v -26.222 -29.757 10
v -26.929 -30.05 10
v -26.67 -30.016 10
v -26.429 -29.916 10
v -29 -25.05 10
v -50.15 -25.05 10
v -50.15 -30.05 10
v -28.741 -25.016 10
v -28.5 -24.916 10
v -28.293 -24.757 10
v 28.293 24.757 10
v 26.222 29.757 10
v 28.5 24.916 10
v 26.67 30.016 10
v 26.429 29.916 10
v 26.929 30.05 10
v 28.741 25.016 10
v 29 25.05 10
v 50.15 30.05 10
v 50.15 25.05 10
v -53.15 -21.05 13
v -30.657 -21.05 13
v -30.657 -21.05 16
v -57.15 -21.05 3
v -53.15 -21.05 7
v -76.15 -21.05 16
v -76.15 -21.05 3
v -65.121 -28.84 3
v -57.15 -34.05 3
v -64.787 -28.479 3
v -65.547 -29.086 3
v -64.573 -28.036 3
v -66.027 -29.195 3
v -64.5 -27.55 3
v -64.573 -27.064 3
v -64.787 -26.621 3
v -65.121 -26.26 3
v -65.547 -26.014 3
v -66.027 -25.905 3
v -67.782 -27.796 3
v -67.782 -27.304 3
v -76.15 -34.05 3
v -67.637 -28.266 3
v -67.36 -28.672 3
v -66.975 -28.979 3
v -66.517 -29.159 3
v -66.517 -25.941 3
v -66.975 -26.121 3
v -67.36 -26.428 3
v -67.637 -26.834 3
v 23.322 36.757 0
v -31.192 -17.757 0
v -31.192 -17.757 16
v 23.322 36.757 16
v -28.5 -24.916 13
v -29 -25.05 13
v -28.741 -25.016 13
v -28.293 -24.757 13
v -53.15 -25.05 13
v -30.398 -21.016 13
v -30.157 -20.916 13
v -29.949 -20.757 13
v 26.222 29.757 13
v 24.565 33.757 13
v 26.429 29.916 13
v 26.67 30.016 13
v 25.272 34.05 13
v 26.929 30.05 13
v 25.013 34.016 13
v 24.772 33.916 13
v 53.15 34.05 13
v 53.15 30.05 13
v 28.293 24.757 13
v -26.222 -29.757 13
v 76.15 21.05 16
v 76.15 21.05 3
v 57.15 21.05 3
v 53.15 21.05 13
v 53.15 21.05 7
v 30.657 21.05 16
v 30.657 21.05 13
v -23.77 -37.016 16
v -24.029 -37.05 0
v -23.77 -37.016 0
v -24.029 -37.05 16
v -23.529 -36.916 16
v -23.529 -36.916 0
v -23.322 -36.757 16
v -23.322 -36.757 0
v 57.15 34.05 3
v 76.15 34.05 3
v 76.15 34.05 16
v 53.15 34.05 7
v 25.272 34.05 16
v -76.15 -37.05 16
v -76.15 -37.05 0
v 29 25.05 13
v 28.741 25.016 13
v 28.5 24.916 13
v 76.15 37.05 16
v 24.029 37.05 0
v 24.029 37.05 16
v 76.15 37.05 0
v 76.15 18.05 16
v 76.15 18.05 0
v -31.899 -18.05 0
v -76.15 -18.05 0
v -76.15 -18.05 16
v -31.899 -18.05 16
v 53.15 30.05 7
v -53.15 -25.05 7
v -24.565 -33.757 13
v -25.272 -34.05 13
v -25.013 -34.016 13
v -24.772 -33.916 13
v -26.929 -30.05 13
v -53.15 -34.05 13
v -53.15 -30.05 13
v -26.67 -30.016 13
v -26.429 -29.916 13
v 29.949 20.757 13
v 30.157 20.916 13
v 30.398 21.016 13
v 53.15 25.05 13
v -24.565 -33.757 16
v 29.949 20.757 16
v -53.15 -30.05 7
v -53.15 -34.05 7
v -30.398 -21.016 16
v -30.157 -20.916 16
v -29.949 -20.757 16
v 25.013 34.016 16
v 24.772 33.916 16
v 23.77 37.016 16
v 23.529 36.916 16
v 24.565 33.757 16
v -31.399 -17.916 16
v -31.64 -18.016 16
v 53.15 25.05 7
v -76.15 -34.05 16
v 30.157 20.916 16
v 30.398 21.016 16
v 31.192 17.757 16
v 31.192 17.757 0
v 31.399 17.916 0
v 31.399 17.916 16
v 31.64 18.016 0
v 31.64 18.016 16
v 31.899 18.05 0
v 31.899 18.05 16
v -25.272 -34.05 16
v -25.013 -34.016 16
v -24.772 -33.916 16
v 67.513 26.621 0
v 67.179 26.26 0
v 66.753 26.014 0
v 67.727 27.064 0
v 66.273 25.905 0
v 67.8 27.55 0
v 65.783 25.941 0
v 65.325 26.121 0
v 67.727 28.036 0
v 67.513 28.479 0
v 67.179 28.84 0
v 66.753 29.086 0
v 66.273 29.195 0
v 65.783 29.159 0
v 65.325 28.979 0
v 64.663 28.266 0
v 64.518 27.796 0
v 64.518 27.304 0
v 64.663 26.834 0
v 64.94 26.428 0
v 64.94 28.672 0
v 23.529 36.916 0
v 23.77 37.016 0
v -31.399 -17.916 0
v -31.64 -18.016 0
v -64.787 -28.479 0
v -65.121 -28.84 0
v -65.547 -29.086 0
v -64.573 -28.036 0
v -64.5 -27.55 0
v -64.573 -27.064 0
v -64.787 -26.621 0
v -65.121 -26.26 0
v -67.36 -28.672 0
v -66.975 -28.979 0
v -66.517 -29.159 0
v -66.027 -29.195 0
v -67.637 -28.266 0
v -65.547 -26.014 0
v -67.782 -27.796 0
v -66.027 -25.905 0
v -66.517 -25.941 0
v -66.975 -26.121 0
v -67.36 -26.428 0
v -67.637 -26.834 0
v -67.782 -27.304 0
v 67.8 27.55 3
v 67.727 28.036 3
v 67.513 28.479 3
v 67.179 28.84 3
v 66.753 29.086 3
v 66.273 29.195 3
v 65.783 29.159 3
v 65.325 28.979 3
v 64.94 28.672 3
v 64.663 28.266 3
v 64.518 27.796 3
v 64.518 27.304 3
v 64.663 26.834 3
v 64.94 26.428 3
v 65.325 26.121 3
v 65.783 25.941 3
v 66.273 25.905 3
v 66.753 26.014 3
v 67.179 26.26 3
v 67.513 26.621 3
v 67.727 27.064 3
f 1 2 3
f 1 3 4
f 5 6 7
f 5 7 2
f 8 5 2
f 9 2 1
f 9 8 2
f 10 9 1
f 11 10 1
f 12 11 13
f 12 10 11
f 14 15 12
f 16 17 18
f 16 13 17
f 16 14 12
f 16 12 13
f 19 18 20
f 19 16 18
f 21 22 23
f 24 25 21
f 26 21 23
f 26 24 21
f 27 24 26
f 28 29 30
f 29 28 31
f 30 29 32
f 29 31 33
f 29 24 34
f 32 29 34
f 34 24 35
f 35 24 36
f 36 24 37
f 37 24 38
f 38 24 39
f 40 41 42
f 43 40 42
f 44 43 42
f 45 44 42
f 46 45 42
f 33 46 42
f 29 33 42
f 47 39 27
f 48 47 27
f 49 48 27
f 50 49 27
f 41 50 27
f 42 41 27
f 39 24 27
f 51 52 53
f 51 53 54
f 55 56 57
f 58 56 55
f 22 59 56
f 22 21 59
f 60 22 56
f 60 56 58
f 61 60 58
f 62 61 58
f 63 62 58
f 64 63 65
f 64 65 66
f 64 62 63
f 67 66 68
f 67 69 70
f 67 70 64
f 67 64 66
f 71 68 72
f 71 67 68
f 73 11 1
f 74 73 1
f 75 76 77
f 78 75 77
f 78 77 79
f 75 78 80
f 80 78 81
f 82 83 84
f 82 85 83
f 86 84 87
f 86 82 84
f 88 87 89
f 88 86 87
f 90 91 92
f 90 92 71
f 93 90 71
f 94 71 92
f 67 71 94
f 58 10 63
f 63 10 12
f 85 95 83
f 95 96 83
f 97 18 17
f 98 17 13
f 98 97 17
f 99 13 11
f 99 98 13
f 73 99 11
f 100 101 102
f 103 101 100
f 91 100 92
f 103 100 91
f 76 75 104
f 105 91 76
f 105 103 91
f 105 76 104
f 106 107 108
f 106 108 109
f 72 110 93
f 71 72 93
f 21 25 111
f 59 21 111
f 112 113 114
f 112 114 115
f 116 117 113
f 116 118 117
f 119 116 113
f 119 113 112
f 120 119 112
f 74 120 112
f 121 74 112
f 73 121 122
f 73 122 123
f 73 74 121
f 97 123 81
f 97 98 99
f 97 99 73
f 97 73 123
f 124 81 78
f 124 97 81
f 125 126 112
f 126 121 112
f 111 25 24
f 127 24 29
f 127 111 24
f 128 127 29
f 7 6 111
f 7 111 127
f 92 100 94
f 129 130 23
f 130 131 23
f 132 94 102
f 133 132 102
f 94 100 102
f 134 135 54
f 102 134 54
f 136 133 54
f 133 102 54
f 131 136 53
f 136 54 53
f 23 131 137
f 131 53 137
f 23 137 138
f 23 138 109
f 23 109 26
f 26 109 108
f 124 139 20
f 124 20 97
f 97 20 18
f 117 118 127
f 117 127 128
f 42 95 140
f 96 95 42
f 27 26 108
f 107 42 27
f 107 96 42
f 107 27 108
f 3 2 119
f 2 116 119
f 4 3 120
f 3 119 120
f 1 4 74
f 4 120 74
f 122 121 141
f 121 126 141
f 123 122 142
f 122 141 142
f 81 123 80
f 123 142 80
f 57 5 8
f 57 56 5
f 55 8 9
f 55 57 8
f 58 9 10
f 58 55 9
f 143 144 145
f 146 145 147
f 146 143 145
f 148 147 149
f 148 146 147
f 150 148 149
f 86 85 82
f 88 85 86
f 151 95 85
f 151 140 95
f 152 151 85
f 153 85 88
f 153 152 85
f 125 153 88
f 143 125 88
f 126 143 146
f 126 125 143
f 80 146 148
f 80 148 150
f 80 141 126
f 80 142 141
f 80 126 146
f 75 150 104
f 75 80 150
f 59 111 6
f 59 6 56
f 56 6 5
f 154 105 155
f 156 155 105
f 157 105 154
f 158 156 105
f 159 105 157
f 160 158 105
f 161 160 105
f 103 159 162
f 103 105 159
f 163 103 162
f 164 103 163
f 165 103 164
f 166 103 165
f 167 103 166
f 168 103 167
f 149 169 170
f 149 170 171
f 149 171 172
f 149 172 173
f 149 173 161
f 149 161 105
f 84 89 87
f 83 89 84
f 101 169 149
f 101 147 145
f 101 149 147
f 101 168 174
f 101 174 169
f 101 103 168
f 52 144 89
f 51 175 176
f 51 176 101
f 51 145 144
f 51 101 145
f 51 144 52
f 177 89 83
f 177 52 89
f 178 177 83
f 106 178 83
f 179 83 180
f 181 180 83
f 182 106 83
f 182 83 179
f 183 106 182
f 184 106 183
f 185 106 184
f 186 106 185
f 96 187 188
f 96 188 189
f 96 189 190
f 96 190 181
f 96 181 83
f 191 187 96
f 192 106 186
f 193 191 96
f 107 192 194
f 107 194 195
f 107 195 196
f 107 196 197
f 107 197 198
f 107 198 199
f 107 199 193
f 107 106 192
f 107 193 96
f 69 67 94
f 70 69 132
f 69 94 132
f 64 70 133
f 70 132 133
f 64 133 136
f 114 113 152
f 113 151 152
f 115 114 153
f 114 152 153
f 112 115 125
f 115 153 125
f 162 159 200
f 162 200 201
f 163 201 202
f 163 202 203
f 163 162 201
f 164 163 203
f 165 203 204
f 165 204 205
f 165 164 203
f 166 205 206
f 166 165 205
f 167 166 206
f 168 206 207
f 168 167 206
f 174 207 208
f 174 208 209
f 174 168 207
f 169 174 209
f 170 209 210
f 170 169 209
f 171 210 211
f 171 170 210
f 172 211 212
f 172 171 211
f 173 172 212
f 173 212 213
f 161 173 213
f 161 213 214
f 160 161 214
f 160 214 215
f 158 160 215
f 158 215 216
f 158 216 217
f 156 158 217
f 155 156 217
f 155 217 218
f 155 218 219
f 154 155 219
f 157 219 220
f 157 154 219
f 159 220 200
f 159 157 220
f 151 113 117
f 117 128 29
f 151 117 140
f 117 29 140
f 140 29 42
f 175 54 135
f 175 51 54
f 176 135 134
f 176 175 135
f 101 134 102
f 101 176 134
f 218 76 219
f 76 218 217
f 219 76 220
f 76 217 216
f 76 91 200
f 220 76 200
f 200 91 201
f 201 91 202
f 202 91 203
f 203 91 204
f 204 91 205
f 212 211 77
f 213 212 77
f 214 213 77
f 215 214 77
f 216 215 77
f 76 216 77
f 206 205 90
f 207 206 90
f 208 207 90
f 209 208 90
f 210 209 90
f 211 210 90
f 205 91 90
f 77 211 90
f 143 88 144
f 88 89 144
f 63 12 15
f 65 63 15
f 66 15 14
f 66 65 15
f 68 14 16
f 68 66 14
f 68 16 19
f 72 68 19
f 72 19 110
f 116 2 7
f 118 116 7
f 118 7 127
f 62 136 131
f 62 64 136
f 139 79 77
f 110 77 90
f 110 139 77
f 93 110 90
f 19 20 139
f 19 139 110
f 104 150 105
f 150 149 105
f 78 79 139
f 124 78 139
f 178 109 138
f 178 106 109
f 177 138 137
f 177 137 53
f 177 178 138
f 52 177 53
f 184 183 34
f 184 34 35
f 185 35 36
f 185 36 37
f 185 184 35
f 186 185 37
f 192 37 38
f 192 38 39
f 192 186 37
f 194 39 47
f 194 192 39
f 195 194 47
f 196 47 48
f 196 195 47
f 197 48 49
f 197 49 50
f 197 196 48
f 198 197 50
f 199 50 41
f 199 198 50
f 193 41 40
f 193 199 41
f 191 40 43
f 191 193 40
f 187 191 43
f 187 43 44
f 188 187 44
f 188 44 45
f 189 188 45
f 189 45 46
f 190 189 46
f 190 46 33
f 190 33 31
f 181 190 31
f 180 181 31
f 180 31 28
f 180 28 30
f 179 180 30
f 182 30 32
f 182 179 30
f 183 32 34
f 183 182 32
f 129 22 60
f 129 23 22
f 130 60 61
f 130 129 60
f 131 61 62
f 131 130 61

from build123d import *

# Parameters (mm, degrees)
SKETCH_10_R     = 1.65
EXTRUDE_1_DEPTH = 3
EXTRUDE_START   = 3
EXTRUDE_2_DEPTH = 7
EXTRUDE_3_DEPTH = 13
CHAMFER_1_SIZE  = 7
EXTRUDE_5_DEPTH = 10
FILLET_1_R      = 1


with BuildPart() as part:
    # 草图10 → 凸台-拉伸1 (new body)
    with BuildSketch(Plane.XY):
        Polygon((-76.15, -18.05), (-31.485028843, -18.05), (23.614971157, 37.05), (76.15, 37.05), (76.15, 18.05), (31.485028843, 18.05), (-23.614971157, -37.05), (-76.15, -37.05), align=None)
        with Locations((-66.15, -27.55)):
            Circle(SKETCH_10_R, mode=Mode.SUBTRACT)
        with Locations((66.15, 27.55)):
            Circle(SKETCH_10_R, mode=Mode.SUBTRACT)
    extrude(amount=EXTRUDE_1_DEPTH)

    # 草图11 → 凸台-拉伸2 (add)
    with BuildSketch(Plane.XY.offset(EXTRUDE_START)):
        Polygon((-57.15, -18.05), (-57.15, -37.05), (-23.614971157, -37.05), (31.485028843, 18.05), (57.15, 18.05), (57.15, 37.05), (23.614971157, 37.05), (-31.485028843, -18.05), align=None)
    extrude(amount=EXTRUDE_2_DEPTH)

    # 草图12 → 凸台-拉伸3 (add)
    with BuildSketch(Plane.XY.offset(EXTRUDE_START)):
        Polygon((-76.15, -18.05), (-31.485028843, -18.05), (23.614971157, 37.05), (76.15, 37.05), (76.15, 34.05), (24.857611845, 34.05), (-30.242388155, -21.05), (-76.15, -21.05), align=None)
        Polygon((-76.15, -34.05), (-76.15, -37.05), (-23.614971157, -37.05), (31.485028843, 18.05), (76.15, 18.05), (76.15, 21.05), (30.242388155, 21.05), (-24.857611845, -34.05), align=None)
    extrude(amount=EXTRUDE_3_DEPTH)

    # 倒角1
    chamfer_1_edges = [part.edges().sort_by_distance(p)[0] for p in [
        (57.15, 27.55, 10),
        (-57.15, -27.55, 10),
    ]]
    chamfer(chamfer_1_edges, length=CHAMFER_1_SIZE - 0.0001)  # a hair under: the kernel refuses the full size

    # 草图15 → 凸台-拉伸5 (add)
    with BuildSketch(Plane.XY.offset(3)):
        Polygon((-53.15, -21.05), (-53.15, -25.05), (-28.585533906, -25.05), (26.514466094, 30.05), (53.15, 30.05), (53.15, 34.05), (24.857611845, 34.05), (-30.242388155, -21.05), align=None)
        Polygon((-53.15, -30.05), (-53.15, -34.05), (-24.857611845, -34.05), (30.242388155, 21.05), (53.15, 21.05), (53.15, 25.05), (28.585533906, 25.05), (-26.514466094, -30.05), align=None)
    extrude(amount=EXTRUDE_5_DEPTH)

    # 圆角1
    fillet_1_edges = [part.edges().sort_by_distance(p)[0] for p in [
        (-31.485028843, -18.05, 8),
        (23.614971157, 37.05, 8),
        (31.485028843, 18.05, 8),
        (-23.614971157, -37.05, 8),
        (-28.585533906, -25.05, 11.5),
        (26.514466094, 30.05, 11.5),
        (-26.514466094, -30.05, 11.5),
        (28.585533906, 25.05, 11.5),
        (24.857611845, 34.05, 14.5),
        (-30.242388155, -21.05, 14.5),
        (-24.857611845, -34.05, 14.5),
        (30.242388155, 21.05, 14.5),
    ]]
    fillet(fillet_1_edges, radius=FILLET_1_R)


solid = part.part
